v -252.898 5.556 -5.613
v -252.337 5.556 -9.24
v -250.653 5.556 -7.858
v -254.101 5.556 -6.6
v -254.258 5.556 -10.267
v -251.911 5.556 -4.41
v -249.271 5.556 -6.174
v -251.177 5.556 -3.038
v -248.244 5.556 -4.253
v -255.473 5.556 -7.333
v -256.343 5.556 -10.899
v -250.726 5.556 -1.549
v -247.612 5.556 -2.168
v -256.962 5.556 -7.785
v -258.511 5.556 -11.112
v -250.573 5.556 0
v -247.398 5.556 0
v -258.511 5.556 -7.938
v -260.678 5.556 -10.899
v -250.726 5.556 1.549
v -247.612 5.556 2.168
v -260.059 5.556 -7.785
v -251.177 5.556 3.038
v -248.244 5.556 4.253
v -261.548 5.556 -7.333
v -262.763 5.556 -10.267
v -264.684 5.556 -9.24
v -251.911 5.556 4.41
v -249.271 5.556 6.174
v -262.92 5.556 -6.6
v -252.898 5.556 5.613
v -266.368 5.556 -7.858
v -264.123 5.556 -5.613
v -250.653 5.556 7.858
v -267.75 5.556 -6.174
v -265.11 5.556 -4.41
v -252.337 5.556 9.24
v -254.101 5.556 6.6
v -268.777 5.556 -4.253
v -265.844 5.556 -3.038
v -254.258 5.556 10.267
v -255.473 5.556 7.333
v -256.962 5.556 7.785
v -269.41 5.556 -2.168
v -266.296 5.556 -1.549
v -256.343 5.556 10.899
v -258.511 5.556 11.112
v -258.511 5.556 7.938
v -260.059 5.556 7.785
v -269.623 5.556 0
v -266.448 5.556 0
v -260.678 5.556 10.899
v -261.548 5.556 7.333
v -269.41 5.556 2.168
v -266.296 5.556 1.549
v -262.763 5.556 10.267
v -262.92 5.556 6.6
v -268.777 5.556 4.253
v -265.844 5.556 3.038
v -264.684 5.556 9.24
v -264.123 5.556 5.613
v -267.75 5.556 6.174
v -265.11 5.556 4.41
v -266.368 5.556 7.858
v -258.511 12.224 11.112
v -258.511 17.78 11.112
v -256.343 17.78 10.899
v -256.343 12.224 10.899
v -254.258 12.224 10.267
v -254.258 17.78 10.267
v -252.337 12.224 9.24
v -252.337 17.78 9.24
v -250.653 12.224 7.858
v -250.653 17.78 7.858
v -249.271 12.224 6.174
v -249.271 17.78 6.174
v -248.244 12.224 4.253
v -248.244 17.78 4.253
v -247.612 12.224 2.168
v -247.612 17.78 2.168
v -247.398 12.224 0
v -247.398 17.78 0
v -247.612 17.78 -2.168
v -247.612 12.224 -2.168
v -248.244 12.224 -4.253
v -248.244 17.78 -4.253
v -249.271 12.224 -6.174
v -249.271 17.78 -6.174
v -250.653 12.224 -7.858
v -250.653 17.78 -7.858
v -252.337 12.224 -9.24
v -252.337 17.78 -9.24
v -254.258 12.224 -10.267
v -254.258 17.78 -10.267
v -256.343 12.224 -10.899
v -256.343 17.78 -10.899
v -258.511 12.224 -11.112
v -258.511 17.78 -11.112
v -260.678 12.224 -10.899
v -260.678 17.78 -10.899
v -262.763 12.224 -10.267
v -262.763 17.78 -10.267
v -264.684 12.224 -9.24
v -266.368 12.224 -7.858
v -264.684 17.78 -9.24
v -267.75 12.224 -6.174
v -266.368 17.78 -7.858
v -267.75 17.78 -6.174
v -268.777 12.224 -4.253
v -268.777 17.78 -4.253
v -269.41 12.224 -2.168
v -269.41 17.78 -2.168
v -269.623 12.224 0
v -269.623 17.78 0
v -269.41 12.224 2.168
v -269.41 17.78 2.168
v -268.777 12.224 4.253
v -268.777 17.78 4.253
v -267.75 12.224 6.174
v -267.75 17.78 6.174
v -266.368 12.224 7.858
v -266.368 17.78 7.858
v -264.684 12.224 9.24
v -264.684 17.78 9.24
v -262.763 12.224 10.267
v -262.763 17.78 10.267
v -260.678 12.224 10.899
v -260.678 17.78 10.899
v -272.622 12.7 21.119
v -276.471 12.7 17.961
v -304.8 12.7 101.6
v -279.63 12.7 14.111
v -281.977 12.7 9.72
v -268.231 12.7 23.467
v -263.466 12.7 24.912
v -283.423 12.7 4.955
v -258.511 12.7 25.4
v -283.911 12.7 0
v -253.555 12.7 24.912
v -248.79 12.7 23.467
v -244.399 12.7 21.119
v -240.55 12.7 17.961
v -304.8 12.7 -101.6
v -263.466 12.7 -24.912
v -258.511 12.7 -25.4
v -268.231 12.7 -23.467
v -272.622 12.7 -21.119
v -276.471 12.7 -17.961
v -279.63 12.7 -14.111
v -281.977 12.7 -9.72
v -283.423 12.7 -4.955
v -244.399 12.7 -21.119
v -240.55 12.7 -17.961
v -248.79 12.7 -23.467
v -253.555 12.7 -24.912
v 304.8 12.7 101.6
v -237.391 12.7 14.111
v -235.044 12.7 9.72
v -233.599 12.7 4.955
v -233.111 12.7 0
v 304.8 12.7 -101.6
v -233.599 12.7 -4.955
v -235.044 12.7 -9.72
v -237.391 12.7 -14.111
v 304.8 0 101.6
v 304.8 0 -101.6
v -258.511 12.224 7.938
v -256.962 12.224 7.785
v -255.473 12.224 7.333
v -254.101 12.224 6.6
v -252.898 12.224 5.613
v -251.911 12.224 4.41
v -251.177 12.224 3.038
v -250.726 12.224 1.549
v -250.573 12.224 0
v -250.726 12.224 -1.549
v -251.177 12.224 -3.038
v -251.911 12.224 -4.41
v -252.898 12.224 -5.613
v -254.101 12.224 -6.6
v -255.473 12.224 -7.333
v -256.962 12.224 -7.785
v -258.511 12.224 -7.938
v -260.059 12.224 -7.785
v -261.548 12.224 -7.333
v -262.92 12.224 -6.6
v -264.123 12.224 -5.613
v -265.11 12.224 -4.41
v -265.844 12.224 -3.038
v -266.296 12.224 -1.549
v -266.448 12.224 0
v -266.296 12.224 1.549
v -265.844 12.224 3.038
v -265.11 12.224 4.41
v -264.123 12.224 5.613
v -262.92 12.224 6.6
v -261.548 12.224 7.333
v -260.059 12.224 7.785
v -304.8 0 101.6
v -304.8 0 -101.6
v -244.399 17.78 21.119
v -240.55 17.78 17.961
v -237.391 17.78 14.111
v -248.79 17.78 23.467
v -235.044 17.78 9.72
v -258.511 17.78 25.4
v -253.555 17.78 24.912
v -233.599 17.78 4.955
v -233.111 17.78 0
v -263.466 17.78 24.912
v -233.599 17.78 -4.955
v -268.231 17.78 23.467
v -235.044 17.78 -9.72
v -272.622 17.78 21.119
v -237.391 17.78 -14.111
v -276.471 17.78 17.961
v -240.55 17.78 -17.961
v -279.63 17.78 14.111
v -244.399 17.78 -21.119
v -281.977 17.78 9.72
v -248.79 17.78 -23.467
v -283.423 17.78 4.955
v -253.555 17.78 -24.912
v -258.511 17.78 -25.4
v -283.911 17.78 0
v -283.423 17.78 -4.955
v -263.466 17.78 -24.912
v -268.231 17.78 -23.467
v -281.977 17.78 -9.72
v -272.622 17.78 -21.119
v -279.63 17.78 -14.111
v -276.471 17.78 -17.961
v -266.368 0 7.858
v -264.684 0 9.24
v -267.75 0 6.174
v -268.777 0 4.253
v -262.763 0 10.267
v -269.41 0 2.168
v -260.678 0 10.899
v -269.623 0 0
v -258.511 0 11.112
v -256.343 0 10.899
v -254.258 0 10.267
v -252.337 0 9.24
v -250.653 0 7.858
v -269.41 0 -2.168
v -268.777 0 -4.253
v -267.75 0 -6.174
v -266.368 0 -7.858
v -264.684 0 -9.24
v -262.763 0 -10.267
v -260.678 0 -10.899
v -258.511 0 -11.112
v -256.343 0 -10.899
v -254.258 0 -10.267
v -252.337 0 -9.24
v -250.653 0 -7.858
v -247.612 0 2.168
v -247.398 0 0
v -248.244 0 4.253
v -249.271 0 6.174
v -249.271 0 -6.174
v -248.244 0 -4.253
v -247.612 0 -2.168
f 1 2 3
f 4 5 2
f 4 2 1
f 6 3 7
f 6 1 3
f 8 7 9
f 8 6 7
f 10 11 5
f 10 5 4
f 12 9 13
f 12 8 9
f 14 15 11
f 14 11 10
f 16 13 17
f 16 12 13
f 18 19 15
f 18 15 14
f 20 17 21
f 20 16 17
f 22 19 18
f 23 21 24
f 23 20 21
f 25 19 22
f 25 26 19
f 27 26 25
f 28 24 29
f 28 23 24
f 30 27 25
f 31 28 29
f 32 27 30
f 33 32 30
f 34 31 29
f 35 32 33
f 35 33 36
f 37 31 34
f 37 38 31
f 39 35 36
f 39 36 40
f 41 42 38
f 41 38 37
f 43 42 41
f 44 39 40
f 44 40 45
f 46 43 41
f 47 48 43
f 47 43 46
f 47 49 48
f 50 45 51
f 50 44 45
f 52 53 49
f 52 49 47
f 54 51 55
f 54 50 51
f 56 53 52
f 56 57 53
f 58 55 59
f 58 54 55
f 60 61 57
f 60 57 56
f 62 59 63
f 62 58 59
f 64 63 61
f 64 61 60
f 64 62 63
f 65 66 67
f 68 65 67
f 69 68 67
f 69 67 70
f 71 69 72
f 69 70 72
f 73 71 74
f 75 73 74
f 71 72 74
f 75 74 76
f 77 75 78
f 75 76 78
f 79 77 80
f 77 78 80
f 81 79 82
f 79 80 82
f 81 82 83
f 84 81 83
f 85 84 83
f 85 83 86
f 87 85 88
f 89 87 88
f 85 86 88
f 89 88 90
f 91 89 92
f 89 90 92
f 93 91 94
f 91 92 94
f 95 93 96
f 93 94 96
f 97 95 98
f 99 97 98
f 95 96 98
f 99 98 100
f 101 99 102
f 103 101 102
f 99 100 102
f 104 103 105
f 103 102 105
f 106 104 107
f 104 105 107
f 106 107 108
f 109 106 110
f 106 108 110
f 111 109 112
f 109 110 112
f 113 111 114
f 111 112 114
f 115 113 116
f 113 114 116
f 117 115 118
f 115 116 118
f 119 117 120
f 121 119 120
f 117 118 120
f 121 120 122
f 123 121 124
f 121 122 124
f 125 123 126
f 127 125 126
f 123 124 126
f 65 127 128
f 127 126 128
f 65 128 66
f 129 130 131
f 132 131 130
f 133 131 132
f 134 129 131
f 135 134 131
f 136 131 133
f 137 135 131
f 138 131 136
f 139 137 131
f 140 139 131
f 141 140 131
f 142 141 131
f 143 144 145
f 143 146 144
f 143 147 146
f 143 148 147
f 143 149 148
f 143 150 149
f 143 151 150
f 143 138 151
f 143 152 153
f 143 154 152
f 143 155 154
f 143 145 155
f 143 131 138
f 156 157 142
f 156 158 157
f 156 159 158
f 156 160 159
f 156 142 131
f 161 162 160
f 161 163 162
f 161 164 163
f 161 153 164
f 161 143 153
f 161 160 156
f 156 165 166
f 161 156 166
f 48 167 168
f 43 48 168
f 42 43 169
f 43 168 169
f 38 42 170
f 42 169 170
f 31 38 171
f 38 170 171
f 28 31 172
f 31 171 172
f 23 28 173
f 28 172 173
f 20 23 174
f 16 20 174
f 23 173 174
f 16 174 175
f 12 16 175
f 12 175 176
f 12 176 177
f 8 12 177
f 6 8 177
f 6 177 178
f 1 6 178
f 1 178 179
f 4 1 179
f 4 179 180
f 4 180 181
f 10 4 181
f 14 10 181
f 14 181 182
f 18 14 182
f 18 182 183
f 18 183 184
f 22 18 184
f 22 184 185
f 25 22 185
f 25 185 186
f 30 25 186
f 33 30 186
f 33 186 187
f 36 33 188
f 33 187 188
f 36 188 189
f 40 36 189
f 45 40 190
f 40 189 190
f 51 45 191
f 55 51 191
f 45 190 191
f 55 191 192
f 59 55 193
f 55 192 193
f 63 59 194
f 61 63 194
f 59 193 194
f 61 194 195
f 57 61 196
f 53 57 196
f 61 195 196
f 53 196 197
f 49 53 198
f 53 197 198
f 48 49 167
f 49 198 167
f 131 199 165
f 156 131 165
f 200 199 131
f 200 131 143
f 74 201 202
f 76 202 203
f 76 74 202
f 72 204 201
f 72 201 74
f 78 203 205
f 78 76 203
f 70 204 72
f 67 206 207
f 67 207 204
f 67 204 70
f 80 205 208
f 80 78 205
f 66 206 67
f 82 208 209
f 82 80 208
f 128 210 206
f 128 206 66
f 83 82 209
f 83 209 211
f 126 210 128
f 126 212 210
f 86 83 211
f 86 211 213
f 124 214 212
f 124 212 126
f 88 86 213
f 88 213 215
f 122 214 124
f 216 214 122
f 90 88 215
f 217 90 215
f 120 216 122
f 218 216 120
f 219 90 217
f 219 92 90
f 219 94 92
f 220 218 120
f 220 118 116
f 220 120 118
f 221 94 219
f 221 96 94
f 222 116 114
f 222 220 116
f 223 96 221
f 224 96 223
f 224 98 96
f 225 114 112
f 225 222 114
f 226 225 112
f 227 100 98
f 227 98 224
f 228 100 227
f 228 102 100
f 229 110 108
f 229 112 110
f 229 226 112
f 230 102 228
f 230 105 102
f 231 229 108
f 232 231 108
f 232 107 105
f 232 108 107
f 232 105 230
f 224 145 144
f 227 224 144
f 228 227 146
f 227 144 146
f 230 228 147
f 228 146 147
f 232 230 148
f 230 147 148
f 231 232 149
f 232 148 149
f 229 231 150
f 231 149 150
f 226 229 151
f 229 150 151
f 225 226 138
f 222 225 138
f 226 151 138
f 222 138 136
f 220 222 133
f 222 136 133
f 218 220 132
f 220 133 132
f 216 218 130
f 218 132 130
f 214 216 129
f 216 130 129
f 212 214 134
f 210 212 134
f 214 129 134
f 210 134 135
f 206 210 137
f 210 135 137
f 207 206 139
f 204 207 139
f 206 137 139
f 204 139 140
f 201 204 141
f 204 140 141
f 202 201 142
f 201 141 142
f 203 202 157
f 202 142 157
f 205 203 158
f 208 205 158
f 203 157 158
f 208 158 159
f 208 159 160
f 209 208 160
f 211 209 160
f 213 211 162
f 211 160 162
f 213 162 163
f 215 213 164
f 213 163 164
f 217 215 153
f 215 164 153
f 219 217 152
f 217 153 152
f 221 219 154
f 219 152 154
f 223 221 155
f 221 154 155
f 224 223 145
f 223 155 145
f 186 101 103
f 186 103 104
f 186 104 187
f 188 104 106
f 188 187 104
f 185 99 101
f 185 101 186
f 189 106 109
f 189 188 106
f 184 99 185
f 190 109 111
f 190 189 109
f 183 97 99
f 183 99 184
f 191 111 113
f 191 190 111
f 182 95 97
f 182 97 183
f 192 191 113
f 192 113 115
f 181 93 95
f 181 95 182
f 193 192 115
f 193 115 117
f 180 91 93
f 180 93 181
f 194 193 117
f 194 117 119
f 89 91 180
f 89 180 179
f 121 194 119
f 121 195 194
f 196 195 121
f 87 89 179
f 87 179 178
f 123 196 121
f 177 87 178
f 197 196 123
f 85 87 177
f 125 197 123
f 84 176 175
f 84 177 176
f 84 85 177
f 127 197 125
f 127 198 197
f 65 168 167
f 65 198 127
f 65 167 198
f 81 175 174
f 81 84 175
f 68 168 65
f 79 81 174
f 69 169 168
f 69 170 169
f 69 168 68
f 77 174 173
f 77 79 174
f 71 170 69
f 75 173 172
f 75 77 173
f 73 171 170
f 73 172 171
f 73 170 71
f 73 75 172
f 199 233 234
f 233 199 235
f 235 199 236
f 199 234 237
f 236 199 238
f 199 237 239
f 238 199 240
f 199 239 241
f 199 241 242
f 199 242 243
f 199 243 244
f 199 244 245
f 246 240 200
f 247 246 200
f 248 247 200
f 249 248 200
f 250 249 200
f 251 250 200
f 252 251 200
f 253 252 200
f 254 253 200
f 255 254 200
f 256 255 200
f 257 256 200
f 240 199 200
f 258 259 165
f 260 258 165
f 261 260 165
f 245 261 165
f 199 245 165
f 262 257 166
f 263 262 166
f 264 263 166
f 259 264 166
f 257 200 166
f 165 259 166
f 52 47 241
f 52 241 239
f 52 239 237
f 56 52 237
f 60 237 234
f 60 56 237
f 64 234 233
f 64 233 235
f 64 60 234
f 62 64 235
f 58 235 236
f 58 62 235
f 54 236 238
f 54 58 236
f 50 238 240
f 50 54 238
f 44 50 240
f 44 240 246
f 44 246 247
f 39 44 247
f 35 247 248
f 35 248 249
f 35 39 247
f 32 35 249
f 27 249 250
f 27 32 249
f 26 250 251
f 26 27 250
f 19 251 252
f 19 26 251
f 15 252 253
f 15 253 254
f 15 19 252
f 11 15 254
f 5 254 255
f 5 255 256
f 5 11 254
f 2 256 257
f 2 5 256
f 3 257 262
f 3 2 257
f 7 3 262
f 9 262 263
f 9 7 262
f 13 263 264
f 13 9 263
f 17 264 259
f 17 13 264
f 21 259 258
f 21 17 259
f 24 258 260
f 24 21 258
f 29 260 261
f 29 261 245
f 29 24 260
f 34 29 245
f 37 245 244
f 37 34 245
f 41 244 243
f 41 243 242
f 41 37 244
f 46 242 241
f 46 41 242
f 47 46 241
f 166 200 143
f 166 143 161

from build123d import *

# Parameters (mm, degrees)
SKETCH1_W           = 609.6
SKETCH1_H           = 203.2
BOSS_EXTRUDE1_DEPTH = 12.7
SKETCH2_R           = 25.4
BOSS_EXTRUDE3_DEPTH = 5.08
SKETCH9_R           = 11.1125
CUT_EXTRUDE4_DEPTH  = 5.55625
CUT_EXTRUDE5_START  = -5.55625
SKETCH10_R          = 11.1125
CUT_EXTRUDE5_DEPTH  = 5.55625
SKETCH11_R          = 7.9375
CUT_EXTRUDE6_DEPTH  = 322.519859517


with BuildPart() as part:
    # Sketch1 → Boss-Extrude1 (new body)
    with BuildSketch(Plane(origin=(0, 0, 0), x_dir=(1, 0, 0), z_dir=(0, 1, 0))):
        Rectangle(SKETCH1_W, SKETCH1_H)
    extrude(amount=BOSS_EXTRUDE1_DEPTH)

    # Sketch2 → Boss-Extrude3 (add)
    with BuildSketch(Plane(origin=(0, 12.7, 0), x_dir=(1, 0, 0), z_dir=(0, 1, 0))):
        with Locations(Location((-258.510557857, 0, 0), (0, 0, 90))):
            Circle(SKETCH2_R)
    extrude(amount=BOSS_EXTRUDE3_DEPTH)

    # Sketch9 → Cut-Extrude4 (cut)
    with BuildSketch(Plane(origin=(0, 17.78, 0), x_dir=(1, 0, 0), z_dir=(0, 1, 0))):
        with Locations(Location((-258.510557857, 0, 0), (0, 0, 270))):
            Circle(SKETCH9_R)
    extrude(amount=-CUT_EXTRUDE4_DEPTH, mode=Mode.SUBTRACT)

    # Sketch10 → Cut-Extrude5 (cut)
    with BuildSketch(Plane(origin=(0, 0, 0), x_dir=(-1, 0, 0), z_dir=(0, -1, 0)).offset(CUT_EXTRUDE5_START)):
        with Locations(Location((258.510557857, 0, 0), (0, 0, 270))):
            Circle(SKETCH10_R)
    extrude(amount=CUT_EXTRUDE5_DEPTH, mode=Mode.SUBTRACT)

    # Sketch11 → Cut-Extrude6 (cut, through all)
    with BuildSketch(Plane(origin=(0, 12.22375, 0), x_dir=(1, 0, 0), z_dir=(0, 1, 0))):
        with Locations(Location((-258.510557857, 0, 0), (0, 0, 270))):
            Circle(SKETCH11_R)
    extrude(amount=-CUT_EXTRUDE6_DEPTH, mode=Mode.SUBTRACT)


solid = part.part
